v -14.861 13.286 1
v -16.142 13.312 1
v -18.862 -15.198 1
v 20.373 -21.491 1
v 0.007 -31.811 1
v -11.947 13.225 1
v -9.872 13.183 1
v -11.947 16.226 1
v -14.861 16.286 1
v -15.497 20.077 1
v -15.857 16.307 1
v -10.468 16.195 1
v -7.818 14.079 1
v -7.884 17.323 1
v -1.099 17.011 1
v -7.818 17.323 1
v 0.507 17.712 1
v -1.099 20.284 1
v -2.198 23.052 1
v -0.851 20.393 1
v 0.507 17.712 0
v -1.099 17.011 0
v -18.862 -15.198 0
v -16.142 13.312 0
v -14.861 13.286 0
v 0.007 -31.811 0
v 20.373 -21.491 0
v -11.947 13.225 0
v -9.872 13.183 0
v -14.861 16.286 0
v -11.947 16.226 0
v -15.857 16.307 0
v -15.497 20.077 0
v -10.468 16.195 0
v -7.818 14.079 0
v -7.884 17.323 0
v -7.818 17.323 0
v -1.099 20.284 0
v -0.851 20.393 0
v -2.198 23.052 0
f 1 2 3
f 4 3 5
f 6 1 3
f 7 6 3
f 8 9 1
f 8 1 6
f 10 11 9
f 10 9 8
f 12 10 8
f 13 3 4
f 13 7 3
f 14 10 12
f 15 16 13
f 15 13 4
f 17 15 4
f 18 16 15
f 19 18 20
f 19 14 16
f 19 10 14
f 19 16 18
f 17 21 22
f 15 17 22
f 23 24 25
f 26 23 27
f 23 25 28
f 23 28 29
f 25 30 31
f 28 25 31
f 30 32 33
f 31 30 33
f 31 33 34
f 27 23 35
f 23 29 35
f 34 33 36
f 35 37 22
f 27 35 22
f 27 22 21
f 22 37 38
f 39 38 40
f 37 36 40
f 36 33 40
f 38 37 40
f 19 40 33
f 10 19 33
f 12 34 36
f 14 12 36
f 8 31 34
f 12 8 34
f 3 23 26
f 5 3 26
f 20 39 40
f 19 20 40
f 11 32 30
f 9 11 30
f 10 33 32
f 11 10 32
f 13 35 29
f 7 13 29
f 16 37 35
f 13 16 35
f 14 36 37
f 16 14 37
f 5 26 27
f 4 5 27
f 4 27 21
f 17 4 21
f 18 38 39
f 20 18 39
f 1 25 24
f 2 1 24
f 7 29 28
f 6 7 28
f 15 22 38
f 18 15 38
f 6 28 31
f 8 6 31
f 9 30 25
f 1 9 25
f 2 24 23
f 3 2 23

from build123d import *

# Parameters (mm, degrees)
F1_DEPTH = 1


# Not quite as in the source:
# - ends of sketch curves that miss each other by under 0.0002 mm in the source are joined


with BuildPart() as f1:
    # F0 (on Top) → F1 (new body)
    with BuildSketch(Plane.XY):
        Polygon((-2.198051, 23.051648), (-15.497051, 20.076648), (-15.856751674, 16.3066919689), (-14.8610655684, 16.2861461385), (-14.8610655684, 13.2855074428), (-16.1424234512, 13.311948043), (-18.862051, -15.198352), (0.006949, -31.811352), (20.3729486667, -21.4913521689), (0.507429, 17.711787), (-1.0988393333, 17.0108418244), (-1.0988393333, 20.2840446021), (-0.851051, 20.392648), align=None)
        Polygon((-11.9467116892, 16.2260088921), (-10.468051674, 16.1954969689), (-7.8843876222, 17.3229593784), (-7.8180441633, 17.3229593784), (-7.8180441633, 14.0787076895), (-9.871652, 13.182552), (-11.9467116892, 13.2253702503), align=None, mode=Mode.SUBTRACT)
    extrude(amount=F1_DEPTH)


solid = f1.part
